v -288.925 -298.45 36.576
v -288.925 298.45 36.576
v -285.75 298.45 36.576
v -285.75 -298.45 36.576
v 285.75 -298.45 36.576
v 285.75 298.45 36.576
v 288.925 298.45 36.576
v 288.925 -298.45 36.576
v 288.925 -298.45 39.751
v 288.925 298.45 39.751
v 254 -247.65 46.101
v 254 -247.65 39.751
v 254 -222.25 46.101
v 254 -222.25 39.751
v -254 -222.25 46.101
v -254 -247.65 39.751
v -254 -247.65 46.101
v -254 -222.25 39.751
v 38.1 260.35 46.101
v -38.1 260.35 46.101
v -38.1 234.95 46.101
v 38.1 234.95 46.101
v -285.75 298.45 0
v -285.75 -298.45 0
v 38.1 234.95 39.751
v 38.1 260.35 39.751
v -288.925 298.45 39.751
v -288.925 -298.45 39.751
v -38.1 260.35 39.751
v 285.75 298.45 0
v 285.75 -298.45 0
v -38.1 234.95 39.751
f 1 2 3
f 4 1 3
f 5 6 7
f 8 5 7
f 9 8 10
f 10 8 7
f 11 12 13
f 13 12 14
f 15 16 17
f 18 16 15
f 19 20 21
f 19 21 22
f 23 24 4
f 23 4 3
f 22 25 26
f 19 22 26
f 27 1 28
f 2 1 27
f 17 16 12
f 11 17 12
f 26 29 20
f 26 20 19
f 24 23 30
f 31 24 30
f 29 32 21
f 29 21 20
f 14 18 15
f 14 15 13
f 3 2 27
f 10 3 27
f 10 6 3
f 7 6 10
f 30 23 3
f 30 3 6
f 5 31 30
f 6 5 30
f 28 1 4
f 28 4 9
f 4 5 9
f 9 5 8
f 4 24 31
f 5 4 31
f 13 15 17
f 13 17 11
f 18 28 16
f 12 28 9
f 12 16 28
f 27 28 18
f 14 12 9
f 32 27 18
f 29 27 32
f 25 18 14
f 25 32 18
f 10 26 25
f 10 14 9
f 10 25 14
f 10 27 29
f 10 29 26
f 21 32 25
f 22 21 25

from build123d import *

# Parameters (mm, degrees)
F0_W     = 571.5
F0_H     = 596.9
F1_DEPTH = 36.576
F2_W     = 577.85
F2_H     = 596.9
F3_DEPTH = 3.175
F4_W     = 508
F4_H     = 25.4
F4_W_2   = 76.2
F5_DEPTH = 6.35


with BuildPart() as f1:
    # F0 (on Top) → F1 (new body)
    with BuildSketch(Plane.XY):
        Rectangle(F0_W, F0_H)
    extrude(amount=F1_DEPTH)

    # F2 (on face) → F3 (join)
    with BuildSketch(Plane.XY.offset(36.576)):
        Rectangle(F2_W, F2_H)
    extrude(amount=F3_DEPTH)

    # F4 (on face) → F5 (join)
    with BuildSketch(Plane.XY.offset(39.751)):
        with Locations((0, -234.95)):
            Rectangle(F4_W, F4_H)
        with Locations((0, 247.65)):
            Rectangle(F4_W_2, F4_H)
    extrude(amount=F5_DEPTH)


solid = f1.part
